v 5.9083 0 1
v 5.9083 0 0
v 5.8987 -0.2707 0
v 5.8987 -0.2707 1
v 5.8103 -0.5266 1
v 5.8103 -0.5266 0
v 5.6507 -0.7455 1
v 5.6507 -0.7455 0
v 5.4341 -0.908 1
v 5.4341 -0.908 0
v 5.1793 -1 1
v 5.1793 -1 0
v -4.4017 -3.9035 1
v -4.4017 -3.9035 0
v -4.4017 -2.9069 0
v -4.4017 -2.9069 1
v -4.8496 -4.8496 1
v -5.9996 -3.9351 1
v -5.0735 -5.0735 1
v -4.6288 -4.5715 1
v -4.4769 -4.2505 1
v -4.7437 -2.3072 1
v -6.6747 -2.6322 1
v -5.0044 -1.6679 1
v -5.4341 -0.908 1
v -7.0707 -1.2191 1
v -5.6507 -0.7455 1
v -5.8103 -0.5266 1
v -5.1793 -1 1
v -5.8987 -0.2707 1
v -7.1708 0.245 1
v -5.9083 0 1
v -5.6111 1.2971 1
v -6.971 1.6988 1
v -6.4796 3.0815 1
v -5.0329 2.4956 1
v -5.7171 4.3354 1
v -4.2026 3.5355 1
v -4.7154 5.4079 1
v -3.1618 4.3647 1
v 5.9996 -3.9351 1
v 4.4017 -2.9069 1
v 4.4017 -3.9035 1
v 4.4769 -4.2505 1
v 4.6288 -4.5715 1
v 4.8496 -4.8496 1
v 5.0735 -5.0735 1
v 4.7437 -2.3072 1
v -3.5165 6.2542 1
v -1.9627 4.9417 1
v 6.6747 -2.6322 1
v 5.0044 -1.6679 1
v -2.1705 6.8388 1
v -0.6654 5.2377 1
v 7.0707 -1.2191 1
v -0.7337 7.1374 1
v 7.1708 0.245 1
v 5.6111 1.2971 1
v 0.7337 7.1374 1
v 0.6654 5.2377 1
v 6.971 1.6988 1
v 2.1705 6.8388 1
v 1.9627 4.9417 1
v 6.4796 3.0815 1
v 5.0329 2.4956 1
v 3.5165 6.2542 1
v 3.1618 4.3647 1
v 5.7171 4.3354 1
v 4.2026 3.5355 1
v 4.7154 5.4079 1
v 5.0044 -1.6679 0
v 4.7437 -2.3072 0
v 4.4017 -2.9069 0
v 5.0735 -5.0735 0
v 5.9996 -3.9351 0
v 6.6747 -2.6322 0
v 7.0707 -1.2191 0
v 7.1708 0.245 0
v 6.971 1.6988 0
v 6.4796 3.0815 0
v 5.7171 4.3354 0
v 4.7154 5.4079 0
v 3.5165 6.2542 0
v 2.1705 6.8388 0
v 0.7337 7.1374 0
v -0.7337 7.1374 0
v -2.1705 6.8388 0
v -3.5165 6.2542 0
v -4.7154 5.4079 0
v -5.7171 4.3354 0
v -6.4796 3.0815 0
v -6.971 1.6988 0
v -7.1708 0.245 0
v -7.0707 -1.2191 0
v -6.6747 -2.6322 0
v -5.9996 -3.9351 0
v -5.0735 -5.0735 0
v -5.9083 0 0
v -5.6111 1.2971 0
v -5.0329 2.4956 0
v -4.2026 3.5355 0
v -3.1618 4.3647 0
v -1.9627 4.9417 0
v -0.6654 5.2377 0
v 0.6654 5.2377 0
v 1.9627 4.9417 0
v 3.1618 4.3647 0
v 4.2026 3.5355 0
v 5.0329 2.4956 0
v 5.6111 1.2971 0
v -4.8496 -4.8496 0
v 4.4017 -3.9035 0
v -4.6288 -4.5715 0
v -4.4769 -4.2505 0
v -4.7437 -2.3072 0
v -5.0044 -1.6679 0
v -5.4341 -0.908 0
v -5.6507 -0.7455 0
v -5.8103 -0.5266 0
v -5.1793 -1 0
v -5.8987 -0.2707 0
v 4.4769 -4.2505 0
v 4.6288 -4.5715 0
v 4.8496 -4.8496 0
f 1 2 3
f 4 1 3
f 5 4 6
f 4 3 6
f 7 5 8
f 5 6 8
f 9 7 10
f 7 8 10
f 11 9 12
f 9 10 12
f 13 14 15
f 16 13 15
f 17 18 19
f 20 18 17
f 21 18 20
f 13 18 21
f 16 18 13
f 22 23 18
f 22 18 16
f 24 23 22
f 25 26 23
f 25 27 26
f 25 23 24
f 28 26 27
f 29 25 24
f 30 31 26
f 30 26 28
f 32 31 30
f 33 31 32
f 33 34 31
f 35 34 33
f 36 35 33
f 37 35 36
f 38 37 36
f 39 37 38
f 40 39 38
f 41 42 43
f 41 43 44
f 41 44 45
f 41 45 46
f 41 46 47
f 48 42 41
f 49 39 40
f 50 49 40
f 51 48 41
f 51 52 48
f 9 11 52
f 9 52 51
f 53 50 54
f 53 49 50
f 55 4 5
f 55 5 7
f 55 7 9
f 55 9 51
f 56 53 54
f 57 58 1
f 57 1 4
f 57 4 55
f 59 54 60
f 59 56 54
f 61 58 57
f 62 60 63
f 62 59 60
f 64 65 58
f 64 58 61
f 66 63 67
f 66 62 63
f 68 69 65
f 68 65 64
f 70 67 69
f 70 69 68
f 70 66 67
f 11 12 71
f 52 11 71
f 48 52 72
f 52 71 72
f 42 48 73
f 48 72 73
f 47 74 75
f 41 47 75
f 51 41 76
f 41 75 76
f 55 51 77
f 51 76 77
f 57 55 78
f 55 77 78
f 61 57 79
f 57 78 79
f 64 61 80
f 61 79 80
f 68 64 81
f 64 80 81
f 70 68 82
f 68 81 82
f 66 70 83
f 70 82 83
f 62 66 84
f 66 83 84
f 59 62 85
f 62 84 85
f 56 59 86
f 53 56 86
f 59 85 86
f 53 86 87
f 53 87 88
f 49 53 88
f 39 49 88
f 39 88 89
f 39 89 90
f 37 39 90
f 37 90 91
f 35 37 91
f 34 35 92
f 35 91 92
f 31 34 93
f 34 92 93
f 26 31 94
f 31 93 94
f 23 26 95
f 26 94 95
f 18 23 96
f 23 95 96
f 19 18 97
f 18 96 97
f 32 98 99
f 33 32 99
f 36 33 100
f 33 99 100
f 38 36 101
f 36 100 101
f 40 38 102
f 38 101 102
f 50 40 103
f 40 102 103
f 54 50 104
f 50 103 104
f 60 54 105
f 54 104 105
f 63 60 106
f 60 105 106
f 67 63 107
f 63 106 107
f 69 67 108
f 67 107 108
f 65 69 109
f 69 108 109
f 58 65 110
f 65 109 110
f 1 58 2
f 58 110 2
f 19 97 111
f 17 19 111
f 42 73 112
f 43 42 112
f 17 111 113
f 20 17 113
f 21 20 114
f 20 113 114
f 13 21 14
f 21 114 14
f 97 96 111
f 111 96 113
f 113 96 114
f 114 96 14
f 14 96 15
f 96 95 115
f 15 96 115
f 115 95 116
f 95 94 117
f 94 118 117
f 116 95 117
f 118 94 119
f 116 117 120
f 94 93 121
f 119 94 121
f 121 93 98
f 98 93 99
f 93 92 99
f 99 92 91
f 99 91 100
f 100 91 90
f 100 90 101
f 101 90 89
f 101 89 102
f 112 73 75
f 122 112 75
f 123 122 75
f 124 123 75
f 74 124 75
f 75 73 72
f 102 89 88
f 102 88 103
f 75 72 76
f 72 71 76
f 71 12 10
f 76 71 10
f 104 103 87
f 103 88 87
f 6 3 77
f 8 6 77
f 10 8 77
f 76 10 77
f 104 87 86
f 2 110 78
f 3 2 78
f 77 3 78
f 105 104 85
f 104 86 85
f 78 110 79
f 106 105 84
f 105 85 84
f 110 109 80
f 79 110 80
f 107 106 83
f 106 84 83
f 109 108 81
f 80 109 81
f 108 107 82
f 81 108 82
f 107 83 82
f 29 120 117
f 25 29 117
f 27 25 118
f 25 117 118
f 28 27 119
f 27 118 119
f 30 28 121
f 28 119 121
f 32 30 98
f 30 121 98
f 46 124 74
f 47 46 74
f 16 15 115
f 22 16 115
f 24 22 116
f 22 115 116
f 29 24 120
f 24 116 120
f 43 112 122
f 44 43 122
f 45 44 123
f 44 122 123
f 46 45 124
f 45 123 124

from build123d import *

# Parameters (mm, degrees)
BOSS_EXTRUDE1_DEPTH = 1


with BuildPart() as part:
    # Sketch2 → Boss-Extrude1 (new body)
    with BuildSketch(Plane.XY):
        with BuildLine():
            Line((-4.401739713, -3.903473849), (-4.401739713, -3.405207986))
            Line((-4.401739713, -3.405207986), (-4.401739713, -2.906942122))
            ThreePointArc((-4.401739713, -2.906942122), (-4.884506928, -1.991787406), (-5.179346001, -1))
            ThreePointArc((-5.179346001, -1), (-5.738651784, -0.642015565), (-5.908333333, 0))
            ThreePointArc((-5.908333333, 0), (0, 5.275), (5.908333333, 0))
            ThreePointArc((5.908333333, 0), (5.738651784, -0.642015565), (5.179346001, -1))
            ThreePointArc((5.179346001, -1), (4.884506928, -1.991787406), (4.401739713, -2.906942122))
            Line((4.401739713, -2.906942122), (4.401739713, -3.405207986))
            Line((4.401739713, -3.405207986), (4.401739713, -3.903473849))
            ThreePointArc((4.401739713, -3.903473849), (4.543651106, -4.41534116), (4.849574008, -4.849574008))
            Line((4.849574008, -4.849574008), (5.073491155, -5.073491155))
            ThreePointArc((5.073491155, -5.073491155), (0, 7.175), (-5.073491155, -5.073491155))
            Line((-5.073491155, -5.073491155), (-4.849574008, -4.849574008))
            ThreePointArc((-4.849574008, -4.849574008), (-4.543651106, -4.41534116), (-4.401739713, -3.903473849))
        make_face()
    extrude(amount=BOSS_EXTRUDE1_DEPTH)


solid = part.part
